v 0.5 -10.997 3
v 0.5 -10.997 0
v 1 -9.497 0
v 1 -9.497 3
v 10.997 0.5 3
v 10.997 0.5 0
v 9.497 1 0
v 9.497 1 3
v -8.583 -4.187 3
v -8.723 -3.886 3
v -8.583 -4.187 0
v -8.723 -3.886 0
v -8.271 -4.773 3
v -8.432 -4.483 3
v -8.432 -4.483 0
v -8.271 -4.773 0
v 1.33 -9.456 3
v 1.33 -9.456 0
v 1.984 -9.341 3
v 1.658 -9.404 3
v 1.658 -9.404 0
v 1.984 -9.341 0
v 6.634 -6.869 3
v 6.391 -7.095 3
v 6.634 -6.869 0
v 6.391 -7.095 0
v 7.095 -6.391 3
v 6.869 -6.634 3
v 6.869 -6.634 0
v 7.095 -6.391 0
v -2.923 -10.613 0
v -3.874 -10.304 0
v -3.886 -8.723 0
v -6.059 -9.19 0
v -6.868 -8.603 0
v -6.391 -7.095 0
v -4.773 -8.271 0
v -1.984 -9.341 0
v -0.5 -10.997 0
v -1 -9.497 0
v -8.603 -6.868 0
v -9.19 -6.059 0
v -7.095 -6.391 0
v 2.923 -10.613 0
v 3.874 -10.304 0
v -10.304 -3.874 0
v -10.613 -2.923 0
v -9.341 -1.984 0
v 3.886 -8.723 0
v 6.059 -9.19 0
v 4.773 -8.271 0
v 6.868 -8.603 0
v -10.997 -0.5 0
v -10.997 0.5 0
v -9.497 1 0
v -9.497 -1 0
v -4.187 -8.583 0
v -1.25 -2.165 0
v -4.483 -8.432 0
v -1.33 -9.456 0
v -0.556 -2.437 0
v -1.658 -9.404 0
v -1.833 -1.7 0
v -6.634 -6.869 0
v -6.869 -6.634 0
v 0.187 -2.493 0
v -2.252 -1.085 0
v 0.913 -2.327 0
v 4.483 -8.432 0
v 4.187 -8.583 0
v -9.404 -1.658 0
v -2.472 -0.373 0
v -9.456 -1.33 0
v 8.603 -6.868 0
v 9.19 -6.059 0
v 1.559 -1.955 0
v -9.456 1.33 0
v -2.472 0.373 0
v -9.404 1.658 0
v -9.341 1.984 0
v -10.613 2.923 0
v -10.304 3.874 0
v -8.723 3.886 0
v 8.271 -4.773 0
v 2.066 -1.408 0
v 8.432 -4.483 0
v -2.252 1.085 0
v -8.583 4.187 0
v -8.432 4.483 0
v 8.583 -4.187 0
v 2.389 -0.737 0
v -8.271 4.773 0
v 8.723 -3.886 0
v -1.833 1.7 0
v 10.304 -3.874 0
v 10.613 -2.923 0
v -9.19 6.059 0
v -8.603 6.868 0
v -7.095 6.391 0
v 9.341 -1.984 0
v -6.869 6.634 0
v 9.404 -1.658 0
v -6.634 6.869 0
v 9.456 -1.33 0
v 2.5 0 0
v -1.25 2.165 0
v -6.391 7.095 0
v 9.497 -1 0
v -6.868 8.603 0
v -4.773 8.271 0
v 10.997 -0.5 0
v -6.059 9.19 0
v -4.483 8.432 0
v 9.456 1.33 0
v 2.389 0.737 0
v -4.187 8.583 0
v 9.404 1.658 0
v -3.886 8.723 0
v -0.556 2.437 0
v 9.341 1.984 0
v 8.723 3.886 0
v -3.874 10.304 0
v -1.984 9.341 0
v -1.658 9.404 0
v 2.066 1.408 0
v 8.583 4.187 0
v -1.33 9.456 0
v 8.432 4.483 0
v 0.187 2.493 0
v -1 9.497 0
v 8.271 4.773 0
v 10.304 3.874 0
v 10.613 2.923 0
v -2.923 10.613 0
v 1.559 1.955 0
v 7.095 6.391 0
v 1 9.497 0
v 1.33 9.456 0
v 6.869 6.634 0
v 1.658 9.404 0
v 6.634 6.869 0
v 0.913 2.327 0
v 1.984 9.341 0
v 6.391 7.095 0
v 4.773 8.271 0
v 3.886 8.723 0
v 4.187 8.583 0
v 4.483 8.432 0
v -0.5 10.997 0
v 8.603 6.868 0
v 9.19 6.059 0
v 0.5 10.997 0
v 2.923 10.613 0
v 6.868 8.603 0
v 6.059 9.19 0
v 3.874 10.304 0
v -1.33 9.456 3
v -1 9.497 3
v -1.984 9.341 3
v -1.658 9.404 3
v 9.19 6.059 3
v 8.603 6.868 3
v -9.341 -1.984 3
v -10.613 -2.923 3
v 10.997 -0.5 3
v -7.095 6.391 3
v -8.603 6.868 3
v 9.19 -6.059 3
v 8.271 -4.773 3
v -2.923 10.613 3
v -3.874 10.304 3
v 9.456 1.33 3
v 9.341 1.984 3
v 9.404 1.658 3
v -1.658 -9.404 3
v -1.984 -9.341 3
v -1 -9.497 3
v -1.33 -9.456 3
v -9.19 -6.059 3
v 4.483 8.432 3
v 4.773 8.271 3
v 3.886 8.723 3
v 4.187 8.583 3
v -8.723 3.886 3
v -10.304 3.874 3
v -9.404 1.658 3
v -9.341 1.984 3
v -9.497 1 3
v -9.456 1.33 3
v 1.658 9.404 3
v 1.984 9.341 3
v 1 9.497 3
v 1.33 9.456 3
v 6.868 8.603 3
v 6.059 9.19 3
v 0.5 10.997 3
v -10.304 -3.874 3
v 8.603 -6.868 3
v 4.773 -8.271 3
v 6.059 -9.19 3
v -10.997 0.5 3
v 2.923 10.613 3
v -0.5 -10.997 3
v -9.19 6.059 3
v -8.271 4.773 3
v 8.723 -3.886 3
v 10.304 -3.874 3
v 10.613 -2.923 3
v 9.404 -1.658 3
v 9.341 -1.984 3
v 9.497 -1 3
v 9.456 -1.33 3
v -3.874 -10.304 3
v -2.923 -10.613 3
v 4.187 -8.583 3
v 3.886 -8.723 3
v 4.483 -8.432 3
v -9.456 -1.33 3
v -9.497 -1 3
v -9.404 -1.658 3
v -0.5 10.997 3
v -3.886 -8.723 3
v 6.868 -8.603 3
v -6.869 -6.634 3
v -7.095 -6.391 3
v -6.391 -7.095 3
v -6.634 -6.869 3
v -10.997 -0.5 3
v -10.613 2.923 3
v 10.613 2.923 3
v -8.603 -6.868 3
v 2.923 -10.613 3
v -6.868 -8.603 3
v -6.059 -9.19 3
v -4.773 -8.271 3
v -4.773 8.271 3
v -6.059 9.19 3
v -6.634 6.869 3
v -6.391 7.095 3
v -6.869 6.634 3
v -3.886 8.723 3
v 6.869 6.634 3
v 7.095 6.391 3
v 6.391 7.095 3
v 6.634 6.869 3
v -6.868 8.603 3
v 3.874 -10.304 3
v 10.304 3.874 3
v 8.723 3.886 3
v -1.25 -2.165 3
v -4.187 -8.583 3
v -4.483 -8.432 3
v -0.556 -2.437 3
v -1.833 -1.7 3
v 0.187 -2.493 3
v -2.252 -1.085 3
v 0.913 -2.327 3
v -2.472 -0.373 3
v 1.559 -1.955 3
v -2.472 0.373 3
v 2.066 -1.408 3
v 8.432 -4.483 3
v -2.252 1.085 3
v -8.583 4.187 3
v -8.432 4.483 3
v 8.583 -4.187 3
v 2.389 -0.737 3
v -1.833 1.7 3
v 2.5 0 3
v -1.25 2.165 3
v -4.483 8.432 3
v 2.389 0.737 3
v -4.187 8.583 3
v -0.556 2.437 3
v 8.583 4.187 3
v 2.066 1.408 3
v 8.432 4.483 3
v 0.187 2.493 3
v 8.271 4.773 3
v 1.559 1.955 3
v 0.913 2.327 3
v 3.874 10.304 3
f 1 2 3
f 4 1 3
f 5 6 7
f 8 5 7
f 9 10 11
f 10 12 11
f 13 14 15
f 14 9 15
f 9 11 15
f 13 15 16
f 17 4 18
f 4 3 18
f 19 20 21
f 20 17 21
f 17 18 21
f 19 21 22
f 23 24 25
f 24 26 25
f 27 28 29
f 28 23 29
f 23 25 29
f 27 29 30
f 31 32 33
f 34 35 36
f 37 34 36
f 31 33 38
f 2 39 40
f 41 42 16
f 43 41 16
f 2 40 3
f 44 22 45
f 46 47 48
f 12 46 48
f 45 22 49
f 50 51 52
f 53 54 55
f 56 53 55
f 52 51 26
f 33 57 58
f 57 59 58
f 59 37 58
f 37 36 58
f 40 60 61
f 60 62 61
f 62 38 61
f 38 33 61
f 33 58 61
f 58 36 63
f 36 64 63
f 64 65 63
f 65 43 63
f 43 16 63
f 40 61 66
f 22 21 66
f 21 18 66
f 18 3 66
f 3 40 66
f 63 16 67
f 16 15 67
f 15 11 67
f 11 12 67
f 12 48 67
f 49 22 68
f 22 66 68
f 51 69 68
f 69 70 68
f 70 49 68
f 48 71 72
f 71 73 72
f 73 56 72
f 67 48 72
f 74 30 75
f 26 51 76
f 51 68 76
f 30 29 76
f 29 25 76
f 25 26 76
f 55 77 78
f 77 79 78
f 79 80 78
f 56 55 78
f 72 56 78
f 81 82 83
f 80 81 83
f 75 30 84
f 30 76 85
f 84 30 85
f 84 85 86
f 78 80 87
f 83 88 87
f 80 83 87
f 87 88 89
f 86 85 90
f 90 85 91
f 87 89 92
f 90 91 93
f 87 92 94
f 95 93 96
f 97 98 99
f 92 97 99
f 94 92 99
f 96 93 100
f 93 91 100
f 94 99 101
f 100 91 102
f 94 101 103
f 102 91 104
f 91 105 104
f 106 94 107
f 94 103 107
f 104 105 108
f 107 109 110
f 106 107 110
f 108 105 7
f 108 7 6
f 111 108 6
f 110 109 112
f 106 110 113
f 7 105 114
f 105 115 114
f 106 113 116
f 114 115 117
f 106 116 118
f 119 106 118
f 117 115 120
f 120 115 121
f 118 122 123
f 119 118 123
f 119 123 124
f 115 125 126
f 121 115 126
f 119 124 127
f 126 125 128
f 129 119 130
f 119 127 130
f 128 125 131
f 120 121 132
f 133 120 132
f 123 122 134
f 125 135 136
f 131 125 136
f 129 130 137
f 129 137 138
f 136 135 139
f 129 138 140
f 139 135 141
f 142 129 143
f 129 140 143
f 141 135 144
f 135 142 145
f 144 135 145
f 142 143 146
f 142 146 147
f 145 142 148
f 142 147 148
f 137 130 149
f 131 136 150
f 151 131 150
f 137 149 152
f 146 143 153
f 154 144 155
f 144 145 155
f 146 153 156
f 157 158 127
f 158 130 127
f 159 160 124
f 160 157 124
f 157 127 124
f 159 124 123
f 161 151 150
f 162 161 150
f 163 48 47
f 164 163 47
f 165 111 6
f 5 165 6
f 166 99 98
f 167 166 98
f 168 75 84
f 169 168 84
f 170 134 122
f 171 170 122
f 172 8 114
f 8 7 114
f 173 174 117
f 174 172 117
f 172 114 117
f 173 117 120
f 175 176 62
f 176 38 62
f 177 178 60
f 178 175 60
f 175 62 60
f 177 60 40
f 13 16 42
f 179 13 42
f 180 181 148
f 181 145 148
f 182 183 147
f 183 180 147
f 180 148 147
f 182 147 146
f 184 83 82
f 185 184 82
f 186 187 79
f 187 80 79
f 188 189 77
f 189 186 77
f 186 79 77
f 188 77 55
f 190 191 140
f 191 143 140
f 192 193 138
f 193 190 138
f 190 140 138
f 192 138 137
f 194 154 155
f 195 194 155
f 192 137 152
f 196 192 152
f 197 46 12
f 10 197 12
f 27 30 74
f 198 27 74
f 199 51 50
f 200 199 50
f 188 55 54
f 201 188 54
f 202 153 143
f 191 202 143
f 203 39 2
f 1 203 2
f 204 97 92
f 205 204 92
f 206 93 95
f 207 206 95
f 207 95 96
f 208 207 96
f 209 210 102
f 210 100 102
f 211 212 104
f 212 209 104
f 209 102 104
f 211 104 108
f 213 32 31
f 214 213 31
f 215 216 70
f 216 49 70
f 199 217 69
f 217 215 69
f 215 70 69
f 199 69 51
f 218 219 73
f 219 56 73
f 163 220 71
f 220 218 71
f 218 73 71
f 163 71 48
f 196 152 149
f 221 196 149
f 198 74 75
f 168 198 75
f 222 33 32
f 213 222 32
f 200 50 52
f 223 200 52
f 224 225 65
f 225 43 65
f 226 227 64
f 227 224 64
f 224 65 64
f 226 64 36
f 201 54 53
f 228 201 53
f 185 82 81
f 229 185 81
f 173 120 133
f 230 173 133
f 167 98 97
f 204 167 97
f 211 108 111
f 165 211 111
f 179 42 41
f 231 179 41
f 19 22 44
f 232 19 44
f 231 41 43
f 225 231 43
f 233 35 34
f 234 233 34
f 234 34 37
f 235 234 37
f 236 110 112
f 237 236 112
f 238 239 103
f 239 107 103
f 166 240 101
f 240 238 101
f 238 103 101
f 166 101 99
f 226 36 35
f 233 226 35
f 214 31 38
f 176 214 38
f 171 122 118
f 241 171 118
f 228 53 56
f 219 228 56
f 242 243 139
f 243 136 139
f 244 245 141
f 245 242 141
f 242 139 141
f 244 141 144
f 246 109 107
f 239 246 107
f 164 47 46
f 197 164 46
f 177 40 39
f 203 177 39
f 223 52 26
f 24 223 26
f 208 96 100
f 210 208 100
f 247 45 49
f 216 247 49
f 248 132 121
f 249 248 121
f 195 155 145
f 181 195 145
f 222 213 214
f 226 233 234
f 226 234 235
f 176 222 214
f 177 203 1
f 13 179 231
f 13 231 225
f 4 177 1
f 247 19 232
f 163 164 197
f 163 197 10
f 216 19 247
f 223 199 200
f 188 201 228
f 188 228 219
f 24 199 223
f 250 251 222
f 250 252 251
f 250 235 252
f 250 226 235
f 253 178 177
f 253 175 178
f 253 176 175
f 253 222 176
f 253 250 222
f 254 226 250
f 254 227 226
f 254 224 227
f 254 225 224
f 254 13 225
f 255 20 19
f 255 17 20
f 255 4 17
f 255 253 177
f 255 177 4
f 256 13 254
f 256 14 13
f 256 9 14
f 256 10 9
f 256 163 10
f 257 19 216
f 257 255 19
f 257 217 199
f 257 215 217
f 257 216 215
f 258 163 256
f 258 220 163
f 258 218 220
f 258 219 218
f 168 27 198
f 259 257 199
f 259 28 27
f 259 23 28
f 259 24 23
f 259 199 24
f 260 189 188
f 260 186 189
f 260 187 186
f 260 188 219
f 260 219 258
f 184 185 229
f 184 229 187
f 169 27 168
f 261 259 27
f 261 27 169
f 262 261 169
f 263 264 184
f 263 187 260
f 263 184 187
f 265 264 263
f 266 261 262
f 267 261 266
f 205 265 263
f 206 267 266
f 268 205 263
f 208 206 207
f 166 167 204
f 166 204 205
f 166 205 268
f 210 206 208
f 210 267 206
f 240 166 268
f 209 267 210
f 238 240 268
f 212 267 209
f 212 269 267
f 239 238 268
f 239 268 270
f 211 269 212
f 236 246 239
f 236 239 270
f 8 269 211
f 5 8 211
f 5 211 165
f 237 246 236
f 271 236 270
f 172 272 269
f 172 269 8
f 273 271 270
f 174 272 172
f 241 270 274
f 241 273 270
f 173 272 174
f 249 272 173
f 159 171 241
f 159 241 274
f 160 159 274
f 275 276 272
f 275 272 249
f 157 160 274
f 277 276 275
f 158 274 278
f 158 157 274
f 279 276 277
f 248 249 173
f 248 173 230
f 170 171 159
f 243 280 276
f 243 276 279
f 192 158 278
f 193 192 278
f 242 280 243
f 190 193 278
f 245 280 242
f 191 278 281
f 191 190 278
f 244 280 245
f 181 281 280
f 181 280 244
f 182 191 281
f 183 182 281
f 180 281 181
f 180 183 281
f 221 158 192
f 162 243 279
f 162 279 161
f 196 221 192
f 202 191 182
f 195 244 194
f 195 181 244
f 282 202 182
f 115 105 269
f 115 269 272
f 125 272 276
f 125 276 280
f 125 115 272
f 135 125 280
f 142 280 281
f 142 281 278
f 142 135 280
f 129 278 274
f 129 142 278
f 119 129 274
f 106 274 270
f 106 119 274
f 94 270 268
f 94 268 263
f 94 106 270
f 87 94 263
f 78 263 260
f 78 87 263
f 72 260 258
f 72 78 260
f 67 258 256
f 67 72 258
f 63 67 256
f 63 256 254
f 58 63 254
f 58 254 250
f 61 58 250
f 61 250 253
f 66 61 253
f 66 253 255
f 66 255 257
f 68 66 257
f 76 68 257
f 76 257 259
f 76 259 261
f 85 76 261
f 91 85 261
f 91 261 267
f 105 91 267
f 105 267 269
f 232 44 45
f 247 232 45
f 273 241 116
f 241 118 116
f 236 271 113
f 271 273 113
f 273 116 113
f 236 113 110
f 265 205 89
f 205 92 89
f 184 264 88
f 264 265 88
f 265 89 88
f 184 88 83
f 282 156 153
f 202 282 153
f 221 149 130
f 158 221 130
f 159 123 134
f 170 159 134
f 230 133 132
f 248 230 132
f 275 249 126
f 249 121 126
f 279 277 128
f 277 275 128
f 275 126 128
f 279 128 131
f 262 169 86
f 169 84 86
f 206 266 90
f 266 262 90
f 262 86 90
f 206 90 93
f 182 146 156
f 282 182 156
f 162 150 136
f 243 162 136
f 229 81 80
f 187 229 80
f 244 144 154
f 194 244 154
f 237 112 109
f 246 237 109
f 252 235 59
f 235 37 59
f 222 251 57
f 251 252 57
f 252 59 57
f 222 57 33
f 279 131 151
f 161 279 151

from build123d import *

# Parameters (mm, degrees)
F0_R     = 9.549297
F0_R_2   = 2.5
F2_DEPTH = 3
F3_COUNT = 20
F3_ANGLE = 342


with BuildPart() as f2:
    # F0 (on Top) + F1 (on face) → F2 (new body)
    with BuildSketch(Plane.XY):
        Circle(F0_R)
        Circle(F0_R_2, mode=Mode.SUBTRACT)
    with BuildSketch(Plane.XY):
        with BuildLine():
            ThreePointArc((-1, 9.496792), (0, 9.549297), (1, 9.496792))
            Line((1, 9.496792), (0.5, 10.996792))
            Line((0.5, 10.996792), (-0.5, 10.996792))
            Line((-0.5, 10.996792), (-1, 9.496792))
        make_face()
    extrude(amount=F2_DEPTH)

    # F3: F2 ×20 about axis
    f3_axis = Axis((0, 0, 3), (0, 0, -1))


with BuildPart() as f2_1:
    add(f2.part)
    for i in range(1, F3_COUNT):
        add(f2.part.rotate(f3_axis, i * F3_ANGLE / (F3_COUNT - 1)))


solid = f2_1.part
